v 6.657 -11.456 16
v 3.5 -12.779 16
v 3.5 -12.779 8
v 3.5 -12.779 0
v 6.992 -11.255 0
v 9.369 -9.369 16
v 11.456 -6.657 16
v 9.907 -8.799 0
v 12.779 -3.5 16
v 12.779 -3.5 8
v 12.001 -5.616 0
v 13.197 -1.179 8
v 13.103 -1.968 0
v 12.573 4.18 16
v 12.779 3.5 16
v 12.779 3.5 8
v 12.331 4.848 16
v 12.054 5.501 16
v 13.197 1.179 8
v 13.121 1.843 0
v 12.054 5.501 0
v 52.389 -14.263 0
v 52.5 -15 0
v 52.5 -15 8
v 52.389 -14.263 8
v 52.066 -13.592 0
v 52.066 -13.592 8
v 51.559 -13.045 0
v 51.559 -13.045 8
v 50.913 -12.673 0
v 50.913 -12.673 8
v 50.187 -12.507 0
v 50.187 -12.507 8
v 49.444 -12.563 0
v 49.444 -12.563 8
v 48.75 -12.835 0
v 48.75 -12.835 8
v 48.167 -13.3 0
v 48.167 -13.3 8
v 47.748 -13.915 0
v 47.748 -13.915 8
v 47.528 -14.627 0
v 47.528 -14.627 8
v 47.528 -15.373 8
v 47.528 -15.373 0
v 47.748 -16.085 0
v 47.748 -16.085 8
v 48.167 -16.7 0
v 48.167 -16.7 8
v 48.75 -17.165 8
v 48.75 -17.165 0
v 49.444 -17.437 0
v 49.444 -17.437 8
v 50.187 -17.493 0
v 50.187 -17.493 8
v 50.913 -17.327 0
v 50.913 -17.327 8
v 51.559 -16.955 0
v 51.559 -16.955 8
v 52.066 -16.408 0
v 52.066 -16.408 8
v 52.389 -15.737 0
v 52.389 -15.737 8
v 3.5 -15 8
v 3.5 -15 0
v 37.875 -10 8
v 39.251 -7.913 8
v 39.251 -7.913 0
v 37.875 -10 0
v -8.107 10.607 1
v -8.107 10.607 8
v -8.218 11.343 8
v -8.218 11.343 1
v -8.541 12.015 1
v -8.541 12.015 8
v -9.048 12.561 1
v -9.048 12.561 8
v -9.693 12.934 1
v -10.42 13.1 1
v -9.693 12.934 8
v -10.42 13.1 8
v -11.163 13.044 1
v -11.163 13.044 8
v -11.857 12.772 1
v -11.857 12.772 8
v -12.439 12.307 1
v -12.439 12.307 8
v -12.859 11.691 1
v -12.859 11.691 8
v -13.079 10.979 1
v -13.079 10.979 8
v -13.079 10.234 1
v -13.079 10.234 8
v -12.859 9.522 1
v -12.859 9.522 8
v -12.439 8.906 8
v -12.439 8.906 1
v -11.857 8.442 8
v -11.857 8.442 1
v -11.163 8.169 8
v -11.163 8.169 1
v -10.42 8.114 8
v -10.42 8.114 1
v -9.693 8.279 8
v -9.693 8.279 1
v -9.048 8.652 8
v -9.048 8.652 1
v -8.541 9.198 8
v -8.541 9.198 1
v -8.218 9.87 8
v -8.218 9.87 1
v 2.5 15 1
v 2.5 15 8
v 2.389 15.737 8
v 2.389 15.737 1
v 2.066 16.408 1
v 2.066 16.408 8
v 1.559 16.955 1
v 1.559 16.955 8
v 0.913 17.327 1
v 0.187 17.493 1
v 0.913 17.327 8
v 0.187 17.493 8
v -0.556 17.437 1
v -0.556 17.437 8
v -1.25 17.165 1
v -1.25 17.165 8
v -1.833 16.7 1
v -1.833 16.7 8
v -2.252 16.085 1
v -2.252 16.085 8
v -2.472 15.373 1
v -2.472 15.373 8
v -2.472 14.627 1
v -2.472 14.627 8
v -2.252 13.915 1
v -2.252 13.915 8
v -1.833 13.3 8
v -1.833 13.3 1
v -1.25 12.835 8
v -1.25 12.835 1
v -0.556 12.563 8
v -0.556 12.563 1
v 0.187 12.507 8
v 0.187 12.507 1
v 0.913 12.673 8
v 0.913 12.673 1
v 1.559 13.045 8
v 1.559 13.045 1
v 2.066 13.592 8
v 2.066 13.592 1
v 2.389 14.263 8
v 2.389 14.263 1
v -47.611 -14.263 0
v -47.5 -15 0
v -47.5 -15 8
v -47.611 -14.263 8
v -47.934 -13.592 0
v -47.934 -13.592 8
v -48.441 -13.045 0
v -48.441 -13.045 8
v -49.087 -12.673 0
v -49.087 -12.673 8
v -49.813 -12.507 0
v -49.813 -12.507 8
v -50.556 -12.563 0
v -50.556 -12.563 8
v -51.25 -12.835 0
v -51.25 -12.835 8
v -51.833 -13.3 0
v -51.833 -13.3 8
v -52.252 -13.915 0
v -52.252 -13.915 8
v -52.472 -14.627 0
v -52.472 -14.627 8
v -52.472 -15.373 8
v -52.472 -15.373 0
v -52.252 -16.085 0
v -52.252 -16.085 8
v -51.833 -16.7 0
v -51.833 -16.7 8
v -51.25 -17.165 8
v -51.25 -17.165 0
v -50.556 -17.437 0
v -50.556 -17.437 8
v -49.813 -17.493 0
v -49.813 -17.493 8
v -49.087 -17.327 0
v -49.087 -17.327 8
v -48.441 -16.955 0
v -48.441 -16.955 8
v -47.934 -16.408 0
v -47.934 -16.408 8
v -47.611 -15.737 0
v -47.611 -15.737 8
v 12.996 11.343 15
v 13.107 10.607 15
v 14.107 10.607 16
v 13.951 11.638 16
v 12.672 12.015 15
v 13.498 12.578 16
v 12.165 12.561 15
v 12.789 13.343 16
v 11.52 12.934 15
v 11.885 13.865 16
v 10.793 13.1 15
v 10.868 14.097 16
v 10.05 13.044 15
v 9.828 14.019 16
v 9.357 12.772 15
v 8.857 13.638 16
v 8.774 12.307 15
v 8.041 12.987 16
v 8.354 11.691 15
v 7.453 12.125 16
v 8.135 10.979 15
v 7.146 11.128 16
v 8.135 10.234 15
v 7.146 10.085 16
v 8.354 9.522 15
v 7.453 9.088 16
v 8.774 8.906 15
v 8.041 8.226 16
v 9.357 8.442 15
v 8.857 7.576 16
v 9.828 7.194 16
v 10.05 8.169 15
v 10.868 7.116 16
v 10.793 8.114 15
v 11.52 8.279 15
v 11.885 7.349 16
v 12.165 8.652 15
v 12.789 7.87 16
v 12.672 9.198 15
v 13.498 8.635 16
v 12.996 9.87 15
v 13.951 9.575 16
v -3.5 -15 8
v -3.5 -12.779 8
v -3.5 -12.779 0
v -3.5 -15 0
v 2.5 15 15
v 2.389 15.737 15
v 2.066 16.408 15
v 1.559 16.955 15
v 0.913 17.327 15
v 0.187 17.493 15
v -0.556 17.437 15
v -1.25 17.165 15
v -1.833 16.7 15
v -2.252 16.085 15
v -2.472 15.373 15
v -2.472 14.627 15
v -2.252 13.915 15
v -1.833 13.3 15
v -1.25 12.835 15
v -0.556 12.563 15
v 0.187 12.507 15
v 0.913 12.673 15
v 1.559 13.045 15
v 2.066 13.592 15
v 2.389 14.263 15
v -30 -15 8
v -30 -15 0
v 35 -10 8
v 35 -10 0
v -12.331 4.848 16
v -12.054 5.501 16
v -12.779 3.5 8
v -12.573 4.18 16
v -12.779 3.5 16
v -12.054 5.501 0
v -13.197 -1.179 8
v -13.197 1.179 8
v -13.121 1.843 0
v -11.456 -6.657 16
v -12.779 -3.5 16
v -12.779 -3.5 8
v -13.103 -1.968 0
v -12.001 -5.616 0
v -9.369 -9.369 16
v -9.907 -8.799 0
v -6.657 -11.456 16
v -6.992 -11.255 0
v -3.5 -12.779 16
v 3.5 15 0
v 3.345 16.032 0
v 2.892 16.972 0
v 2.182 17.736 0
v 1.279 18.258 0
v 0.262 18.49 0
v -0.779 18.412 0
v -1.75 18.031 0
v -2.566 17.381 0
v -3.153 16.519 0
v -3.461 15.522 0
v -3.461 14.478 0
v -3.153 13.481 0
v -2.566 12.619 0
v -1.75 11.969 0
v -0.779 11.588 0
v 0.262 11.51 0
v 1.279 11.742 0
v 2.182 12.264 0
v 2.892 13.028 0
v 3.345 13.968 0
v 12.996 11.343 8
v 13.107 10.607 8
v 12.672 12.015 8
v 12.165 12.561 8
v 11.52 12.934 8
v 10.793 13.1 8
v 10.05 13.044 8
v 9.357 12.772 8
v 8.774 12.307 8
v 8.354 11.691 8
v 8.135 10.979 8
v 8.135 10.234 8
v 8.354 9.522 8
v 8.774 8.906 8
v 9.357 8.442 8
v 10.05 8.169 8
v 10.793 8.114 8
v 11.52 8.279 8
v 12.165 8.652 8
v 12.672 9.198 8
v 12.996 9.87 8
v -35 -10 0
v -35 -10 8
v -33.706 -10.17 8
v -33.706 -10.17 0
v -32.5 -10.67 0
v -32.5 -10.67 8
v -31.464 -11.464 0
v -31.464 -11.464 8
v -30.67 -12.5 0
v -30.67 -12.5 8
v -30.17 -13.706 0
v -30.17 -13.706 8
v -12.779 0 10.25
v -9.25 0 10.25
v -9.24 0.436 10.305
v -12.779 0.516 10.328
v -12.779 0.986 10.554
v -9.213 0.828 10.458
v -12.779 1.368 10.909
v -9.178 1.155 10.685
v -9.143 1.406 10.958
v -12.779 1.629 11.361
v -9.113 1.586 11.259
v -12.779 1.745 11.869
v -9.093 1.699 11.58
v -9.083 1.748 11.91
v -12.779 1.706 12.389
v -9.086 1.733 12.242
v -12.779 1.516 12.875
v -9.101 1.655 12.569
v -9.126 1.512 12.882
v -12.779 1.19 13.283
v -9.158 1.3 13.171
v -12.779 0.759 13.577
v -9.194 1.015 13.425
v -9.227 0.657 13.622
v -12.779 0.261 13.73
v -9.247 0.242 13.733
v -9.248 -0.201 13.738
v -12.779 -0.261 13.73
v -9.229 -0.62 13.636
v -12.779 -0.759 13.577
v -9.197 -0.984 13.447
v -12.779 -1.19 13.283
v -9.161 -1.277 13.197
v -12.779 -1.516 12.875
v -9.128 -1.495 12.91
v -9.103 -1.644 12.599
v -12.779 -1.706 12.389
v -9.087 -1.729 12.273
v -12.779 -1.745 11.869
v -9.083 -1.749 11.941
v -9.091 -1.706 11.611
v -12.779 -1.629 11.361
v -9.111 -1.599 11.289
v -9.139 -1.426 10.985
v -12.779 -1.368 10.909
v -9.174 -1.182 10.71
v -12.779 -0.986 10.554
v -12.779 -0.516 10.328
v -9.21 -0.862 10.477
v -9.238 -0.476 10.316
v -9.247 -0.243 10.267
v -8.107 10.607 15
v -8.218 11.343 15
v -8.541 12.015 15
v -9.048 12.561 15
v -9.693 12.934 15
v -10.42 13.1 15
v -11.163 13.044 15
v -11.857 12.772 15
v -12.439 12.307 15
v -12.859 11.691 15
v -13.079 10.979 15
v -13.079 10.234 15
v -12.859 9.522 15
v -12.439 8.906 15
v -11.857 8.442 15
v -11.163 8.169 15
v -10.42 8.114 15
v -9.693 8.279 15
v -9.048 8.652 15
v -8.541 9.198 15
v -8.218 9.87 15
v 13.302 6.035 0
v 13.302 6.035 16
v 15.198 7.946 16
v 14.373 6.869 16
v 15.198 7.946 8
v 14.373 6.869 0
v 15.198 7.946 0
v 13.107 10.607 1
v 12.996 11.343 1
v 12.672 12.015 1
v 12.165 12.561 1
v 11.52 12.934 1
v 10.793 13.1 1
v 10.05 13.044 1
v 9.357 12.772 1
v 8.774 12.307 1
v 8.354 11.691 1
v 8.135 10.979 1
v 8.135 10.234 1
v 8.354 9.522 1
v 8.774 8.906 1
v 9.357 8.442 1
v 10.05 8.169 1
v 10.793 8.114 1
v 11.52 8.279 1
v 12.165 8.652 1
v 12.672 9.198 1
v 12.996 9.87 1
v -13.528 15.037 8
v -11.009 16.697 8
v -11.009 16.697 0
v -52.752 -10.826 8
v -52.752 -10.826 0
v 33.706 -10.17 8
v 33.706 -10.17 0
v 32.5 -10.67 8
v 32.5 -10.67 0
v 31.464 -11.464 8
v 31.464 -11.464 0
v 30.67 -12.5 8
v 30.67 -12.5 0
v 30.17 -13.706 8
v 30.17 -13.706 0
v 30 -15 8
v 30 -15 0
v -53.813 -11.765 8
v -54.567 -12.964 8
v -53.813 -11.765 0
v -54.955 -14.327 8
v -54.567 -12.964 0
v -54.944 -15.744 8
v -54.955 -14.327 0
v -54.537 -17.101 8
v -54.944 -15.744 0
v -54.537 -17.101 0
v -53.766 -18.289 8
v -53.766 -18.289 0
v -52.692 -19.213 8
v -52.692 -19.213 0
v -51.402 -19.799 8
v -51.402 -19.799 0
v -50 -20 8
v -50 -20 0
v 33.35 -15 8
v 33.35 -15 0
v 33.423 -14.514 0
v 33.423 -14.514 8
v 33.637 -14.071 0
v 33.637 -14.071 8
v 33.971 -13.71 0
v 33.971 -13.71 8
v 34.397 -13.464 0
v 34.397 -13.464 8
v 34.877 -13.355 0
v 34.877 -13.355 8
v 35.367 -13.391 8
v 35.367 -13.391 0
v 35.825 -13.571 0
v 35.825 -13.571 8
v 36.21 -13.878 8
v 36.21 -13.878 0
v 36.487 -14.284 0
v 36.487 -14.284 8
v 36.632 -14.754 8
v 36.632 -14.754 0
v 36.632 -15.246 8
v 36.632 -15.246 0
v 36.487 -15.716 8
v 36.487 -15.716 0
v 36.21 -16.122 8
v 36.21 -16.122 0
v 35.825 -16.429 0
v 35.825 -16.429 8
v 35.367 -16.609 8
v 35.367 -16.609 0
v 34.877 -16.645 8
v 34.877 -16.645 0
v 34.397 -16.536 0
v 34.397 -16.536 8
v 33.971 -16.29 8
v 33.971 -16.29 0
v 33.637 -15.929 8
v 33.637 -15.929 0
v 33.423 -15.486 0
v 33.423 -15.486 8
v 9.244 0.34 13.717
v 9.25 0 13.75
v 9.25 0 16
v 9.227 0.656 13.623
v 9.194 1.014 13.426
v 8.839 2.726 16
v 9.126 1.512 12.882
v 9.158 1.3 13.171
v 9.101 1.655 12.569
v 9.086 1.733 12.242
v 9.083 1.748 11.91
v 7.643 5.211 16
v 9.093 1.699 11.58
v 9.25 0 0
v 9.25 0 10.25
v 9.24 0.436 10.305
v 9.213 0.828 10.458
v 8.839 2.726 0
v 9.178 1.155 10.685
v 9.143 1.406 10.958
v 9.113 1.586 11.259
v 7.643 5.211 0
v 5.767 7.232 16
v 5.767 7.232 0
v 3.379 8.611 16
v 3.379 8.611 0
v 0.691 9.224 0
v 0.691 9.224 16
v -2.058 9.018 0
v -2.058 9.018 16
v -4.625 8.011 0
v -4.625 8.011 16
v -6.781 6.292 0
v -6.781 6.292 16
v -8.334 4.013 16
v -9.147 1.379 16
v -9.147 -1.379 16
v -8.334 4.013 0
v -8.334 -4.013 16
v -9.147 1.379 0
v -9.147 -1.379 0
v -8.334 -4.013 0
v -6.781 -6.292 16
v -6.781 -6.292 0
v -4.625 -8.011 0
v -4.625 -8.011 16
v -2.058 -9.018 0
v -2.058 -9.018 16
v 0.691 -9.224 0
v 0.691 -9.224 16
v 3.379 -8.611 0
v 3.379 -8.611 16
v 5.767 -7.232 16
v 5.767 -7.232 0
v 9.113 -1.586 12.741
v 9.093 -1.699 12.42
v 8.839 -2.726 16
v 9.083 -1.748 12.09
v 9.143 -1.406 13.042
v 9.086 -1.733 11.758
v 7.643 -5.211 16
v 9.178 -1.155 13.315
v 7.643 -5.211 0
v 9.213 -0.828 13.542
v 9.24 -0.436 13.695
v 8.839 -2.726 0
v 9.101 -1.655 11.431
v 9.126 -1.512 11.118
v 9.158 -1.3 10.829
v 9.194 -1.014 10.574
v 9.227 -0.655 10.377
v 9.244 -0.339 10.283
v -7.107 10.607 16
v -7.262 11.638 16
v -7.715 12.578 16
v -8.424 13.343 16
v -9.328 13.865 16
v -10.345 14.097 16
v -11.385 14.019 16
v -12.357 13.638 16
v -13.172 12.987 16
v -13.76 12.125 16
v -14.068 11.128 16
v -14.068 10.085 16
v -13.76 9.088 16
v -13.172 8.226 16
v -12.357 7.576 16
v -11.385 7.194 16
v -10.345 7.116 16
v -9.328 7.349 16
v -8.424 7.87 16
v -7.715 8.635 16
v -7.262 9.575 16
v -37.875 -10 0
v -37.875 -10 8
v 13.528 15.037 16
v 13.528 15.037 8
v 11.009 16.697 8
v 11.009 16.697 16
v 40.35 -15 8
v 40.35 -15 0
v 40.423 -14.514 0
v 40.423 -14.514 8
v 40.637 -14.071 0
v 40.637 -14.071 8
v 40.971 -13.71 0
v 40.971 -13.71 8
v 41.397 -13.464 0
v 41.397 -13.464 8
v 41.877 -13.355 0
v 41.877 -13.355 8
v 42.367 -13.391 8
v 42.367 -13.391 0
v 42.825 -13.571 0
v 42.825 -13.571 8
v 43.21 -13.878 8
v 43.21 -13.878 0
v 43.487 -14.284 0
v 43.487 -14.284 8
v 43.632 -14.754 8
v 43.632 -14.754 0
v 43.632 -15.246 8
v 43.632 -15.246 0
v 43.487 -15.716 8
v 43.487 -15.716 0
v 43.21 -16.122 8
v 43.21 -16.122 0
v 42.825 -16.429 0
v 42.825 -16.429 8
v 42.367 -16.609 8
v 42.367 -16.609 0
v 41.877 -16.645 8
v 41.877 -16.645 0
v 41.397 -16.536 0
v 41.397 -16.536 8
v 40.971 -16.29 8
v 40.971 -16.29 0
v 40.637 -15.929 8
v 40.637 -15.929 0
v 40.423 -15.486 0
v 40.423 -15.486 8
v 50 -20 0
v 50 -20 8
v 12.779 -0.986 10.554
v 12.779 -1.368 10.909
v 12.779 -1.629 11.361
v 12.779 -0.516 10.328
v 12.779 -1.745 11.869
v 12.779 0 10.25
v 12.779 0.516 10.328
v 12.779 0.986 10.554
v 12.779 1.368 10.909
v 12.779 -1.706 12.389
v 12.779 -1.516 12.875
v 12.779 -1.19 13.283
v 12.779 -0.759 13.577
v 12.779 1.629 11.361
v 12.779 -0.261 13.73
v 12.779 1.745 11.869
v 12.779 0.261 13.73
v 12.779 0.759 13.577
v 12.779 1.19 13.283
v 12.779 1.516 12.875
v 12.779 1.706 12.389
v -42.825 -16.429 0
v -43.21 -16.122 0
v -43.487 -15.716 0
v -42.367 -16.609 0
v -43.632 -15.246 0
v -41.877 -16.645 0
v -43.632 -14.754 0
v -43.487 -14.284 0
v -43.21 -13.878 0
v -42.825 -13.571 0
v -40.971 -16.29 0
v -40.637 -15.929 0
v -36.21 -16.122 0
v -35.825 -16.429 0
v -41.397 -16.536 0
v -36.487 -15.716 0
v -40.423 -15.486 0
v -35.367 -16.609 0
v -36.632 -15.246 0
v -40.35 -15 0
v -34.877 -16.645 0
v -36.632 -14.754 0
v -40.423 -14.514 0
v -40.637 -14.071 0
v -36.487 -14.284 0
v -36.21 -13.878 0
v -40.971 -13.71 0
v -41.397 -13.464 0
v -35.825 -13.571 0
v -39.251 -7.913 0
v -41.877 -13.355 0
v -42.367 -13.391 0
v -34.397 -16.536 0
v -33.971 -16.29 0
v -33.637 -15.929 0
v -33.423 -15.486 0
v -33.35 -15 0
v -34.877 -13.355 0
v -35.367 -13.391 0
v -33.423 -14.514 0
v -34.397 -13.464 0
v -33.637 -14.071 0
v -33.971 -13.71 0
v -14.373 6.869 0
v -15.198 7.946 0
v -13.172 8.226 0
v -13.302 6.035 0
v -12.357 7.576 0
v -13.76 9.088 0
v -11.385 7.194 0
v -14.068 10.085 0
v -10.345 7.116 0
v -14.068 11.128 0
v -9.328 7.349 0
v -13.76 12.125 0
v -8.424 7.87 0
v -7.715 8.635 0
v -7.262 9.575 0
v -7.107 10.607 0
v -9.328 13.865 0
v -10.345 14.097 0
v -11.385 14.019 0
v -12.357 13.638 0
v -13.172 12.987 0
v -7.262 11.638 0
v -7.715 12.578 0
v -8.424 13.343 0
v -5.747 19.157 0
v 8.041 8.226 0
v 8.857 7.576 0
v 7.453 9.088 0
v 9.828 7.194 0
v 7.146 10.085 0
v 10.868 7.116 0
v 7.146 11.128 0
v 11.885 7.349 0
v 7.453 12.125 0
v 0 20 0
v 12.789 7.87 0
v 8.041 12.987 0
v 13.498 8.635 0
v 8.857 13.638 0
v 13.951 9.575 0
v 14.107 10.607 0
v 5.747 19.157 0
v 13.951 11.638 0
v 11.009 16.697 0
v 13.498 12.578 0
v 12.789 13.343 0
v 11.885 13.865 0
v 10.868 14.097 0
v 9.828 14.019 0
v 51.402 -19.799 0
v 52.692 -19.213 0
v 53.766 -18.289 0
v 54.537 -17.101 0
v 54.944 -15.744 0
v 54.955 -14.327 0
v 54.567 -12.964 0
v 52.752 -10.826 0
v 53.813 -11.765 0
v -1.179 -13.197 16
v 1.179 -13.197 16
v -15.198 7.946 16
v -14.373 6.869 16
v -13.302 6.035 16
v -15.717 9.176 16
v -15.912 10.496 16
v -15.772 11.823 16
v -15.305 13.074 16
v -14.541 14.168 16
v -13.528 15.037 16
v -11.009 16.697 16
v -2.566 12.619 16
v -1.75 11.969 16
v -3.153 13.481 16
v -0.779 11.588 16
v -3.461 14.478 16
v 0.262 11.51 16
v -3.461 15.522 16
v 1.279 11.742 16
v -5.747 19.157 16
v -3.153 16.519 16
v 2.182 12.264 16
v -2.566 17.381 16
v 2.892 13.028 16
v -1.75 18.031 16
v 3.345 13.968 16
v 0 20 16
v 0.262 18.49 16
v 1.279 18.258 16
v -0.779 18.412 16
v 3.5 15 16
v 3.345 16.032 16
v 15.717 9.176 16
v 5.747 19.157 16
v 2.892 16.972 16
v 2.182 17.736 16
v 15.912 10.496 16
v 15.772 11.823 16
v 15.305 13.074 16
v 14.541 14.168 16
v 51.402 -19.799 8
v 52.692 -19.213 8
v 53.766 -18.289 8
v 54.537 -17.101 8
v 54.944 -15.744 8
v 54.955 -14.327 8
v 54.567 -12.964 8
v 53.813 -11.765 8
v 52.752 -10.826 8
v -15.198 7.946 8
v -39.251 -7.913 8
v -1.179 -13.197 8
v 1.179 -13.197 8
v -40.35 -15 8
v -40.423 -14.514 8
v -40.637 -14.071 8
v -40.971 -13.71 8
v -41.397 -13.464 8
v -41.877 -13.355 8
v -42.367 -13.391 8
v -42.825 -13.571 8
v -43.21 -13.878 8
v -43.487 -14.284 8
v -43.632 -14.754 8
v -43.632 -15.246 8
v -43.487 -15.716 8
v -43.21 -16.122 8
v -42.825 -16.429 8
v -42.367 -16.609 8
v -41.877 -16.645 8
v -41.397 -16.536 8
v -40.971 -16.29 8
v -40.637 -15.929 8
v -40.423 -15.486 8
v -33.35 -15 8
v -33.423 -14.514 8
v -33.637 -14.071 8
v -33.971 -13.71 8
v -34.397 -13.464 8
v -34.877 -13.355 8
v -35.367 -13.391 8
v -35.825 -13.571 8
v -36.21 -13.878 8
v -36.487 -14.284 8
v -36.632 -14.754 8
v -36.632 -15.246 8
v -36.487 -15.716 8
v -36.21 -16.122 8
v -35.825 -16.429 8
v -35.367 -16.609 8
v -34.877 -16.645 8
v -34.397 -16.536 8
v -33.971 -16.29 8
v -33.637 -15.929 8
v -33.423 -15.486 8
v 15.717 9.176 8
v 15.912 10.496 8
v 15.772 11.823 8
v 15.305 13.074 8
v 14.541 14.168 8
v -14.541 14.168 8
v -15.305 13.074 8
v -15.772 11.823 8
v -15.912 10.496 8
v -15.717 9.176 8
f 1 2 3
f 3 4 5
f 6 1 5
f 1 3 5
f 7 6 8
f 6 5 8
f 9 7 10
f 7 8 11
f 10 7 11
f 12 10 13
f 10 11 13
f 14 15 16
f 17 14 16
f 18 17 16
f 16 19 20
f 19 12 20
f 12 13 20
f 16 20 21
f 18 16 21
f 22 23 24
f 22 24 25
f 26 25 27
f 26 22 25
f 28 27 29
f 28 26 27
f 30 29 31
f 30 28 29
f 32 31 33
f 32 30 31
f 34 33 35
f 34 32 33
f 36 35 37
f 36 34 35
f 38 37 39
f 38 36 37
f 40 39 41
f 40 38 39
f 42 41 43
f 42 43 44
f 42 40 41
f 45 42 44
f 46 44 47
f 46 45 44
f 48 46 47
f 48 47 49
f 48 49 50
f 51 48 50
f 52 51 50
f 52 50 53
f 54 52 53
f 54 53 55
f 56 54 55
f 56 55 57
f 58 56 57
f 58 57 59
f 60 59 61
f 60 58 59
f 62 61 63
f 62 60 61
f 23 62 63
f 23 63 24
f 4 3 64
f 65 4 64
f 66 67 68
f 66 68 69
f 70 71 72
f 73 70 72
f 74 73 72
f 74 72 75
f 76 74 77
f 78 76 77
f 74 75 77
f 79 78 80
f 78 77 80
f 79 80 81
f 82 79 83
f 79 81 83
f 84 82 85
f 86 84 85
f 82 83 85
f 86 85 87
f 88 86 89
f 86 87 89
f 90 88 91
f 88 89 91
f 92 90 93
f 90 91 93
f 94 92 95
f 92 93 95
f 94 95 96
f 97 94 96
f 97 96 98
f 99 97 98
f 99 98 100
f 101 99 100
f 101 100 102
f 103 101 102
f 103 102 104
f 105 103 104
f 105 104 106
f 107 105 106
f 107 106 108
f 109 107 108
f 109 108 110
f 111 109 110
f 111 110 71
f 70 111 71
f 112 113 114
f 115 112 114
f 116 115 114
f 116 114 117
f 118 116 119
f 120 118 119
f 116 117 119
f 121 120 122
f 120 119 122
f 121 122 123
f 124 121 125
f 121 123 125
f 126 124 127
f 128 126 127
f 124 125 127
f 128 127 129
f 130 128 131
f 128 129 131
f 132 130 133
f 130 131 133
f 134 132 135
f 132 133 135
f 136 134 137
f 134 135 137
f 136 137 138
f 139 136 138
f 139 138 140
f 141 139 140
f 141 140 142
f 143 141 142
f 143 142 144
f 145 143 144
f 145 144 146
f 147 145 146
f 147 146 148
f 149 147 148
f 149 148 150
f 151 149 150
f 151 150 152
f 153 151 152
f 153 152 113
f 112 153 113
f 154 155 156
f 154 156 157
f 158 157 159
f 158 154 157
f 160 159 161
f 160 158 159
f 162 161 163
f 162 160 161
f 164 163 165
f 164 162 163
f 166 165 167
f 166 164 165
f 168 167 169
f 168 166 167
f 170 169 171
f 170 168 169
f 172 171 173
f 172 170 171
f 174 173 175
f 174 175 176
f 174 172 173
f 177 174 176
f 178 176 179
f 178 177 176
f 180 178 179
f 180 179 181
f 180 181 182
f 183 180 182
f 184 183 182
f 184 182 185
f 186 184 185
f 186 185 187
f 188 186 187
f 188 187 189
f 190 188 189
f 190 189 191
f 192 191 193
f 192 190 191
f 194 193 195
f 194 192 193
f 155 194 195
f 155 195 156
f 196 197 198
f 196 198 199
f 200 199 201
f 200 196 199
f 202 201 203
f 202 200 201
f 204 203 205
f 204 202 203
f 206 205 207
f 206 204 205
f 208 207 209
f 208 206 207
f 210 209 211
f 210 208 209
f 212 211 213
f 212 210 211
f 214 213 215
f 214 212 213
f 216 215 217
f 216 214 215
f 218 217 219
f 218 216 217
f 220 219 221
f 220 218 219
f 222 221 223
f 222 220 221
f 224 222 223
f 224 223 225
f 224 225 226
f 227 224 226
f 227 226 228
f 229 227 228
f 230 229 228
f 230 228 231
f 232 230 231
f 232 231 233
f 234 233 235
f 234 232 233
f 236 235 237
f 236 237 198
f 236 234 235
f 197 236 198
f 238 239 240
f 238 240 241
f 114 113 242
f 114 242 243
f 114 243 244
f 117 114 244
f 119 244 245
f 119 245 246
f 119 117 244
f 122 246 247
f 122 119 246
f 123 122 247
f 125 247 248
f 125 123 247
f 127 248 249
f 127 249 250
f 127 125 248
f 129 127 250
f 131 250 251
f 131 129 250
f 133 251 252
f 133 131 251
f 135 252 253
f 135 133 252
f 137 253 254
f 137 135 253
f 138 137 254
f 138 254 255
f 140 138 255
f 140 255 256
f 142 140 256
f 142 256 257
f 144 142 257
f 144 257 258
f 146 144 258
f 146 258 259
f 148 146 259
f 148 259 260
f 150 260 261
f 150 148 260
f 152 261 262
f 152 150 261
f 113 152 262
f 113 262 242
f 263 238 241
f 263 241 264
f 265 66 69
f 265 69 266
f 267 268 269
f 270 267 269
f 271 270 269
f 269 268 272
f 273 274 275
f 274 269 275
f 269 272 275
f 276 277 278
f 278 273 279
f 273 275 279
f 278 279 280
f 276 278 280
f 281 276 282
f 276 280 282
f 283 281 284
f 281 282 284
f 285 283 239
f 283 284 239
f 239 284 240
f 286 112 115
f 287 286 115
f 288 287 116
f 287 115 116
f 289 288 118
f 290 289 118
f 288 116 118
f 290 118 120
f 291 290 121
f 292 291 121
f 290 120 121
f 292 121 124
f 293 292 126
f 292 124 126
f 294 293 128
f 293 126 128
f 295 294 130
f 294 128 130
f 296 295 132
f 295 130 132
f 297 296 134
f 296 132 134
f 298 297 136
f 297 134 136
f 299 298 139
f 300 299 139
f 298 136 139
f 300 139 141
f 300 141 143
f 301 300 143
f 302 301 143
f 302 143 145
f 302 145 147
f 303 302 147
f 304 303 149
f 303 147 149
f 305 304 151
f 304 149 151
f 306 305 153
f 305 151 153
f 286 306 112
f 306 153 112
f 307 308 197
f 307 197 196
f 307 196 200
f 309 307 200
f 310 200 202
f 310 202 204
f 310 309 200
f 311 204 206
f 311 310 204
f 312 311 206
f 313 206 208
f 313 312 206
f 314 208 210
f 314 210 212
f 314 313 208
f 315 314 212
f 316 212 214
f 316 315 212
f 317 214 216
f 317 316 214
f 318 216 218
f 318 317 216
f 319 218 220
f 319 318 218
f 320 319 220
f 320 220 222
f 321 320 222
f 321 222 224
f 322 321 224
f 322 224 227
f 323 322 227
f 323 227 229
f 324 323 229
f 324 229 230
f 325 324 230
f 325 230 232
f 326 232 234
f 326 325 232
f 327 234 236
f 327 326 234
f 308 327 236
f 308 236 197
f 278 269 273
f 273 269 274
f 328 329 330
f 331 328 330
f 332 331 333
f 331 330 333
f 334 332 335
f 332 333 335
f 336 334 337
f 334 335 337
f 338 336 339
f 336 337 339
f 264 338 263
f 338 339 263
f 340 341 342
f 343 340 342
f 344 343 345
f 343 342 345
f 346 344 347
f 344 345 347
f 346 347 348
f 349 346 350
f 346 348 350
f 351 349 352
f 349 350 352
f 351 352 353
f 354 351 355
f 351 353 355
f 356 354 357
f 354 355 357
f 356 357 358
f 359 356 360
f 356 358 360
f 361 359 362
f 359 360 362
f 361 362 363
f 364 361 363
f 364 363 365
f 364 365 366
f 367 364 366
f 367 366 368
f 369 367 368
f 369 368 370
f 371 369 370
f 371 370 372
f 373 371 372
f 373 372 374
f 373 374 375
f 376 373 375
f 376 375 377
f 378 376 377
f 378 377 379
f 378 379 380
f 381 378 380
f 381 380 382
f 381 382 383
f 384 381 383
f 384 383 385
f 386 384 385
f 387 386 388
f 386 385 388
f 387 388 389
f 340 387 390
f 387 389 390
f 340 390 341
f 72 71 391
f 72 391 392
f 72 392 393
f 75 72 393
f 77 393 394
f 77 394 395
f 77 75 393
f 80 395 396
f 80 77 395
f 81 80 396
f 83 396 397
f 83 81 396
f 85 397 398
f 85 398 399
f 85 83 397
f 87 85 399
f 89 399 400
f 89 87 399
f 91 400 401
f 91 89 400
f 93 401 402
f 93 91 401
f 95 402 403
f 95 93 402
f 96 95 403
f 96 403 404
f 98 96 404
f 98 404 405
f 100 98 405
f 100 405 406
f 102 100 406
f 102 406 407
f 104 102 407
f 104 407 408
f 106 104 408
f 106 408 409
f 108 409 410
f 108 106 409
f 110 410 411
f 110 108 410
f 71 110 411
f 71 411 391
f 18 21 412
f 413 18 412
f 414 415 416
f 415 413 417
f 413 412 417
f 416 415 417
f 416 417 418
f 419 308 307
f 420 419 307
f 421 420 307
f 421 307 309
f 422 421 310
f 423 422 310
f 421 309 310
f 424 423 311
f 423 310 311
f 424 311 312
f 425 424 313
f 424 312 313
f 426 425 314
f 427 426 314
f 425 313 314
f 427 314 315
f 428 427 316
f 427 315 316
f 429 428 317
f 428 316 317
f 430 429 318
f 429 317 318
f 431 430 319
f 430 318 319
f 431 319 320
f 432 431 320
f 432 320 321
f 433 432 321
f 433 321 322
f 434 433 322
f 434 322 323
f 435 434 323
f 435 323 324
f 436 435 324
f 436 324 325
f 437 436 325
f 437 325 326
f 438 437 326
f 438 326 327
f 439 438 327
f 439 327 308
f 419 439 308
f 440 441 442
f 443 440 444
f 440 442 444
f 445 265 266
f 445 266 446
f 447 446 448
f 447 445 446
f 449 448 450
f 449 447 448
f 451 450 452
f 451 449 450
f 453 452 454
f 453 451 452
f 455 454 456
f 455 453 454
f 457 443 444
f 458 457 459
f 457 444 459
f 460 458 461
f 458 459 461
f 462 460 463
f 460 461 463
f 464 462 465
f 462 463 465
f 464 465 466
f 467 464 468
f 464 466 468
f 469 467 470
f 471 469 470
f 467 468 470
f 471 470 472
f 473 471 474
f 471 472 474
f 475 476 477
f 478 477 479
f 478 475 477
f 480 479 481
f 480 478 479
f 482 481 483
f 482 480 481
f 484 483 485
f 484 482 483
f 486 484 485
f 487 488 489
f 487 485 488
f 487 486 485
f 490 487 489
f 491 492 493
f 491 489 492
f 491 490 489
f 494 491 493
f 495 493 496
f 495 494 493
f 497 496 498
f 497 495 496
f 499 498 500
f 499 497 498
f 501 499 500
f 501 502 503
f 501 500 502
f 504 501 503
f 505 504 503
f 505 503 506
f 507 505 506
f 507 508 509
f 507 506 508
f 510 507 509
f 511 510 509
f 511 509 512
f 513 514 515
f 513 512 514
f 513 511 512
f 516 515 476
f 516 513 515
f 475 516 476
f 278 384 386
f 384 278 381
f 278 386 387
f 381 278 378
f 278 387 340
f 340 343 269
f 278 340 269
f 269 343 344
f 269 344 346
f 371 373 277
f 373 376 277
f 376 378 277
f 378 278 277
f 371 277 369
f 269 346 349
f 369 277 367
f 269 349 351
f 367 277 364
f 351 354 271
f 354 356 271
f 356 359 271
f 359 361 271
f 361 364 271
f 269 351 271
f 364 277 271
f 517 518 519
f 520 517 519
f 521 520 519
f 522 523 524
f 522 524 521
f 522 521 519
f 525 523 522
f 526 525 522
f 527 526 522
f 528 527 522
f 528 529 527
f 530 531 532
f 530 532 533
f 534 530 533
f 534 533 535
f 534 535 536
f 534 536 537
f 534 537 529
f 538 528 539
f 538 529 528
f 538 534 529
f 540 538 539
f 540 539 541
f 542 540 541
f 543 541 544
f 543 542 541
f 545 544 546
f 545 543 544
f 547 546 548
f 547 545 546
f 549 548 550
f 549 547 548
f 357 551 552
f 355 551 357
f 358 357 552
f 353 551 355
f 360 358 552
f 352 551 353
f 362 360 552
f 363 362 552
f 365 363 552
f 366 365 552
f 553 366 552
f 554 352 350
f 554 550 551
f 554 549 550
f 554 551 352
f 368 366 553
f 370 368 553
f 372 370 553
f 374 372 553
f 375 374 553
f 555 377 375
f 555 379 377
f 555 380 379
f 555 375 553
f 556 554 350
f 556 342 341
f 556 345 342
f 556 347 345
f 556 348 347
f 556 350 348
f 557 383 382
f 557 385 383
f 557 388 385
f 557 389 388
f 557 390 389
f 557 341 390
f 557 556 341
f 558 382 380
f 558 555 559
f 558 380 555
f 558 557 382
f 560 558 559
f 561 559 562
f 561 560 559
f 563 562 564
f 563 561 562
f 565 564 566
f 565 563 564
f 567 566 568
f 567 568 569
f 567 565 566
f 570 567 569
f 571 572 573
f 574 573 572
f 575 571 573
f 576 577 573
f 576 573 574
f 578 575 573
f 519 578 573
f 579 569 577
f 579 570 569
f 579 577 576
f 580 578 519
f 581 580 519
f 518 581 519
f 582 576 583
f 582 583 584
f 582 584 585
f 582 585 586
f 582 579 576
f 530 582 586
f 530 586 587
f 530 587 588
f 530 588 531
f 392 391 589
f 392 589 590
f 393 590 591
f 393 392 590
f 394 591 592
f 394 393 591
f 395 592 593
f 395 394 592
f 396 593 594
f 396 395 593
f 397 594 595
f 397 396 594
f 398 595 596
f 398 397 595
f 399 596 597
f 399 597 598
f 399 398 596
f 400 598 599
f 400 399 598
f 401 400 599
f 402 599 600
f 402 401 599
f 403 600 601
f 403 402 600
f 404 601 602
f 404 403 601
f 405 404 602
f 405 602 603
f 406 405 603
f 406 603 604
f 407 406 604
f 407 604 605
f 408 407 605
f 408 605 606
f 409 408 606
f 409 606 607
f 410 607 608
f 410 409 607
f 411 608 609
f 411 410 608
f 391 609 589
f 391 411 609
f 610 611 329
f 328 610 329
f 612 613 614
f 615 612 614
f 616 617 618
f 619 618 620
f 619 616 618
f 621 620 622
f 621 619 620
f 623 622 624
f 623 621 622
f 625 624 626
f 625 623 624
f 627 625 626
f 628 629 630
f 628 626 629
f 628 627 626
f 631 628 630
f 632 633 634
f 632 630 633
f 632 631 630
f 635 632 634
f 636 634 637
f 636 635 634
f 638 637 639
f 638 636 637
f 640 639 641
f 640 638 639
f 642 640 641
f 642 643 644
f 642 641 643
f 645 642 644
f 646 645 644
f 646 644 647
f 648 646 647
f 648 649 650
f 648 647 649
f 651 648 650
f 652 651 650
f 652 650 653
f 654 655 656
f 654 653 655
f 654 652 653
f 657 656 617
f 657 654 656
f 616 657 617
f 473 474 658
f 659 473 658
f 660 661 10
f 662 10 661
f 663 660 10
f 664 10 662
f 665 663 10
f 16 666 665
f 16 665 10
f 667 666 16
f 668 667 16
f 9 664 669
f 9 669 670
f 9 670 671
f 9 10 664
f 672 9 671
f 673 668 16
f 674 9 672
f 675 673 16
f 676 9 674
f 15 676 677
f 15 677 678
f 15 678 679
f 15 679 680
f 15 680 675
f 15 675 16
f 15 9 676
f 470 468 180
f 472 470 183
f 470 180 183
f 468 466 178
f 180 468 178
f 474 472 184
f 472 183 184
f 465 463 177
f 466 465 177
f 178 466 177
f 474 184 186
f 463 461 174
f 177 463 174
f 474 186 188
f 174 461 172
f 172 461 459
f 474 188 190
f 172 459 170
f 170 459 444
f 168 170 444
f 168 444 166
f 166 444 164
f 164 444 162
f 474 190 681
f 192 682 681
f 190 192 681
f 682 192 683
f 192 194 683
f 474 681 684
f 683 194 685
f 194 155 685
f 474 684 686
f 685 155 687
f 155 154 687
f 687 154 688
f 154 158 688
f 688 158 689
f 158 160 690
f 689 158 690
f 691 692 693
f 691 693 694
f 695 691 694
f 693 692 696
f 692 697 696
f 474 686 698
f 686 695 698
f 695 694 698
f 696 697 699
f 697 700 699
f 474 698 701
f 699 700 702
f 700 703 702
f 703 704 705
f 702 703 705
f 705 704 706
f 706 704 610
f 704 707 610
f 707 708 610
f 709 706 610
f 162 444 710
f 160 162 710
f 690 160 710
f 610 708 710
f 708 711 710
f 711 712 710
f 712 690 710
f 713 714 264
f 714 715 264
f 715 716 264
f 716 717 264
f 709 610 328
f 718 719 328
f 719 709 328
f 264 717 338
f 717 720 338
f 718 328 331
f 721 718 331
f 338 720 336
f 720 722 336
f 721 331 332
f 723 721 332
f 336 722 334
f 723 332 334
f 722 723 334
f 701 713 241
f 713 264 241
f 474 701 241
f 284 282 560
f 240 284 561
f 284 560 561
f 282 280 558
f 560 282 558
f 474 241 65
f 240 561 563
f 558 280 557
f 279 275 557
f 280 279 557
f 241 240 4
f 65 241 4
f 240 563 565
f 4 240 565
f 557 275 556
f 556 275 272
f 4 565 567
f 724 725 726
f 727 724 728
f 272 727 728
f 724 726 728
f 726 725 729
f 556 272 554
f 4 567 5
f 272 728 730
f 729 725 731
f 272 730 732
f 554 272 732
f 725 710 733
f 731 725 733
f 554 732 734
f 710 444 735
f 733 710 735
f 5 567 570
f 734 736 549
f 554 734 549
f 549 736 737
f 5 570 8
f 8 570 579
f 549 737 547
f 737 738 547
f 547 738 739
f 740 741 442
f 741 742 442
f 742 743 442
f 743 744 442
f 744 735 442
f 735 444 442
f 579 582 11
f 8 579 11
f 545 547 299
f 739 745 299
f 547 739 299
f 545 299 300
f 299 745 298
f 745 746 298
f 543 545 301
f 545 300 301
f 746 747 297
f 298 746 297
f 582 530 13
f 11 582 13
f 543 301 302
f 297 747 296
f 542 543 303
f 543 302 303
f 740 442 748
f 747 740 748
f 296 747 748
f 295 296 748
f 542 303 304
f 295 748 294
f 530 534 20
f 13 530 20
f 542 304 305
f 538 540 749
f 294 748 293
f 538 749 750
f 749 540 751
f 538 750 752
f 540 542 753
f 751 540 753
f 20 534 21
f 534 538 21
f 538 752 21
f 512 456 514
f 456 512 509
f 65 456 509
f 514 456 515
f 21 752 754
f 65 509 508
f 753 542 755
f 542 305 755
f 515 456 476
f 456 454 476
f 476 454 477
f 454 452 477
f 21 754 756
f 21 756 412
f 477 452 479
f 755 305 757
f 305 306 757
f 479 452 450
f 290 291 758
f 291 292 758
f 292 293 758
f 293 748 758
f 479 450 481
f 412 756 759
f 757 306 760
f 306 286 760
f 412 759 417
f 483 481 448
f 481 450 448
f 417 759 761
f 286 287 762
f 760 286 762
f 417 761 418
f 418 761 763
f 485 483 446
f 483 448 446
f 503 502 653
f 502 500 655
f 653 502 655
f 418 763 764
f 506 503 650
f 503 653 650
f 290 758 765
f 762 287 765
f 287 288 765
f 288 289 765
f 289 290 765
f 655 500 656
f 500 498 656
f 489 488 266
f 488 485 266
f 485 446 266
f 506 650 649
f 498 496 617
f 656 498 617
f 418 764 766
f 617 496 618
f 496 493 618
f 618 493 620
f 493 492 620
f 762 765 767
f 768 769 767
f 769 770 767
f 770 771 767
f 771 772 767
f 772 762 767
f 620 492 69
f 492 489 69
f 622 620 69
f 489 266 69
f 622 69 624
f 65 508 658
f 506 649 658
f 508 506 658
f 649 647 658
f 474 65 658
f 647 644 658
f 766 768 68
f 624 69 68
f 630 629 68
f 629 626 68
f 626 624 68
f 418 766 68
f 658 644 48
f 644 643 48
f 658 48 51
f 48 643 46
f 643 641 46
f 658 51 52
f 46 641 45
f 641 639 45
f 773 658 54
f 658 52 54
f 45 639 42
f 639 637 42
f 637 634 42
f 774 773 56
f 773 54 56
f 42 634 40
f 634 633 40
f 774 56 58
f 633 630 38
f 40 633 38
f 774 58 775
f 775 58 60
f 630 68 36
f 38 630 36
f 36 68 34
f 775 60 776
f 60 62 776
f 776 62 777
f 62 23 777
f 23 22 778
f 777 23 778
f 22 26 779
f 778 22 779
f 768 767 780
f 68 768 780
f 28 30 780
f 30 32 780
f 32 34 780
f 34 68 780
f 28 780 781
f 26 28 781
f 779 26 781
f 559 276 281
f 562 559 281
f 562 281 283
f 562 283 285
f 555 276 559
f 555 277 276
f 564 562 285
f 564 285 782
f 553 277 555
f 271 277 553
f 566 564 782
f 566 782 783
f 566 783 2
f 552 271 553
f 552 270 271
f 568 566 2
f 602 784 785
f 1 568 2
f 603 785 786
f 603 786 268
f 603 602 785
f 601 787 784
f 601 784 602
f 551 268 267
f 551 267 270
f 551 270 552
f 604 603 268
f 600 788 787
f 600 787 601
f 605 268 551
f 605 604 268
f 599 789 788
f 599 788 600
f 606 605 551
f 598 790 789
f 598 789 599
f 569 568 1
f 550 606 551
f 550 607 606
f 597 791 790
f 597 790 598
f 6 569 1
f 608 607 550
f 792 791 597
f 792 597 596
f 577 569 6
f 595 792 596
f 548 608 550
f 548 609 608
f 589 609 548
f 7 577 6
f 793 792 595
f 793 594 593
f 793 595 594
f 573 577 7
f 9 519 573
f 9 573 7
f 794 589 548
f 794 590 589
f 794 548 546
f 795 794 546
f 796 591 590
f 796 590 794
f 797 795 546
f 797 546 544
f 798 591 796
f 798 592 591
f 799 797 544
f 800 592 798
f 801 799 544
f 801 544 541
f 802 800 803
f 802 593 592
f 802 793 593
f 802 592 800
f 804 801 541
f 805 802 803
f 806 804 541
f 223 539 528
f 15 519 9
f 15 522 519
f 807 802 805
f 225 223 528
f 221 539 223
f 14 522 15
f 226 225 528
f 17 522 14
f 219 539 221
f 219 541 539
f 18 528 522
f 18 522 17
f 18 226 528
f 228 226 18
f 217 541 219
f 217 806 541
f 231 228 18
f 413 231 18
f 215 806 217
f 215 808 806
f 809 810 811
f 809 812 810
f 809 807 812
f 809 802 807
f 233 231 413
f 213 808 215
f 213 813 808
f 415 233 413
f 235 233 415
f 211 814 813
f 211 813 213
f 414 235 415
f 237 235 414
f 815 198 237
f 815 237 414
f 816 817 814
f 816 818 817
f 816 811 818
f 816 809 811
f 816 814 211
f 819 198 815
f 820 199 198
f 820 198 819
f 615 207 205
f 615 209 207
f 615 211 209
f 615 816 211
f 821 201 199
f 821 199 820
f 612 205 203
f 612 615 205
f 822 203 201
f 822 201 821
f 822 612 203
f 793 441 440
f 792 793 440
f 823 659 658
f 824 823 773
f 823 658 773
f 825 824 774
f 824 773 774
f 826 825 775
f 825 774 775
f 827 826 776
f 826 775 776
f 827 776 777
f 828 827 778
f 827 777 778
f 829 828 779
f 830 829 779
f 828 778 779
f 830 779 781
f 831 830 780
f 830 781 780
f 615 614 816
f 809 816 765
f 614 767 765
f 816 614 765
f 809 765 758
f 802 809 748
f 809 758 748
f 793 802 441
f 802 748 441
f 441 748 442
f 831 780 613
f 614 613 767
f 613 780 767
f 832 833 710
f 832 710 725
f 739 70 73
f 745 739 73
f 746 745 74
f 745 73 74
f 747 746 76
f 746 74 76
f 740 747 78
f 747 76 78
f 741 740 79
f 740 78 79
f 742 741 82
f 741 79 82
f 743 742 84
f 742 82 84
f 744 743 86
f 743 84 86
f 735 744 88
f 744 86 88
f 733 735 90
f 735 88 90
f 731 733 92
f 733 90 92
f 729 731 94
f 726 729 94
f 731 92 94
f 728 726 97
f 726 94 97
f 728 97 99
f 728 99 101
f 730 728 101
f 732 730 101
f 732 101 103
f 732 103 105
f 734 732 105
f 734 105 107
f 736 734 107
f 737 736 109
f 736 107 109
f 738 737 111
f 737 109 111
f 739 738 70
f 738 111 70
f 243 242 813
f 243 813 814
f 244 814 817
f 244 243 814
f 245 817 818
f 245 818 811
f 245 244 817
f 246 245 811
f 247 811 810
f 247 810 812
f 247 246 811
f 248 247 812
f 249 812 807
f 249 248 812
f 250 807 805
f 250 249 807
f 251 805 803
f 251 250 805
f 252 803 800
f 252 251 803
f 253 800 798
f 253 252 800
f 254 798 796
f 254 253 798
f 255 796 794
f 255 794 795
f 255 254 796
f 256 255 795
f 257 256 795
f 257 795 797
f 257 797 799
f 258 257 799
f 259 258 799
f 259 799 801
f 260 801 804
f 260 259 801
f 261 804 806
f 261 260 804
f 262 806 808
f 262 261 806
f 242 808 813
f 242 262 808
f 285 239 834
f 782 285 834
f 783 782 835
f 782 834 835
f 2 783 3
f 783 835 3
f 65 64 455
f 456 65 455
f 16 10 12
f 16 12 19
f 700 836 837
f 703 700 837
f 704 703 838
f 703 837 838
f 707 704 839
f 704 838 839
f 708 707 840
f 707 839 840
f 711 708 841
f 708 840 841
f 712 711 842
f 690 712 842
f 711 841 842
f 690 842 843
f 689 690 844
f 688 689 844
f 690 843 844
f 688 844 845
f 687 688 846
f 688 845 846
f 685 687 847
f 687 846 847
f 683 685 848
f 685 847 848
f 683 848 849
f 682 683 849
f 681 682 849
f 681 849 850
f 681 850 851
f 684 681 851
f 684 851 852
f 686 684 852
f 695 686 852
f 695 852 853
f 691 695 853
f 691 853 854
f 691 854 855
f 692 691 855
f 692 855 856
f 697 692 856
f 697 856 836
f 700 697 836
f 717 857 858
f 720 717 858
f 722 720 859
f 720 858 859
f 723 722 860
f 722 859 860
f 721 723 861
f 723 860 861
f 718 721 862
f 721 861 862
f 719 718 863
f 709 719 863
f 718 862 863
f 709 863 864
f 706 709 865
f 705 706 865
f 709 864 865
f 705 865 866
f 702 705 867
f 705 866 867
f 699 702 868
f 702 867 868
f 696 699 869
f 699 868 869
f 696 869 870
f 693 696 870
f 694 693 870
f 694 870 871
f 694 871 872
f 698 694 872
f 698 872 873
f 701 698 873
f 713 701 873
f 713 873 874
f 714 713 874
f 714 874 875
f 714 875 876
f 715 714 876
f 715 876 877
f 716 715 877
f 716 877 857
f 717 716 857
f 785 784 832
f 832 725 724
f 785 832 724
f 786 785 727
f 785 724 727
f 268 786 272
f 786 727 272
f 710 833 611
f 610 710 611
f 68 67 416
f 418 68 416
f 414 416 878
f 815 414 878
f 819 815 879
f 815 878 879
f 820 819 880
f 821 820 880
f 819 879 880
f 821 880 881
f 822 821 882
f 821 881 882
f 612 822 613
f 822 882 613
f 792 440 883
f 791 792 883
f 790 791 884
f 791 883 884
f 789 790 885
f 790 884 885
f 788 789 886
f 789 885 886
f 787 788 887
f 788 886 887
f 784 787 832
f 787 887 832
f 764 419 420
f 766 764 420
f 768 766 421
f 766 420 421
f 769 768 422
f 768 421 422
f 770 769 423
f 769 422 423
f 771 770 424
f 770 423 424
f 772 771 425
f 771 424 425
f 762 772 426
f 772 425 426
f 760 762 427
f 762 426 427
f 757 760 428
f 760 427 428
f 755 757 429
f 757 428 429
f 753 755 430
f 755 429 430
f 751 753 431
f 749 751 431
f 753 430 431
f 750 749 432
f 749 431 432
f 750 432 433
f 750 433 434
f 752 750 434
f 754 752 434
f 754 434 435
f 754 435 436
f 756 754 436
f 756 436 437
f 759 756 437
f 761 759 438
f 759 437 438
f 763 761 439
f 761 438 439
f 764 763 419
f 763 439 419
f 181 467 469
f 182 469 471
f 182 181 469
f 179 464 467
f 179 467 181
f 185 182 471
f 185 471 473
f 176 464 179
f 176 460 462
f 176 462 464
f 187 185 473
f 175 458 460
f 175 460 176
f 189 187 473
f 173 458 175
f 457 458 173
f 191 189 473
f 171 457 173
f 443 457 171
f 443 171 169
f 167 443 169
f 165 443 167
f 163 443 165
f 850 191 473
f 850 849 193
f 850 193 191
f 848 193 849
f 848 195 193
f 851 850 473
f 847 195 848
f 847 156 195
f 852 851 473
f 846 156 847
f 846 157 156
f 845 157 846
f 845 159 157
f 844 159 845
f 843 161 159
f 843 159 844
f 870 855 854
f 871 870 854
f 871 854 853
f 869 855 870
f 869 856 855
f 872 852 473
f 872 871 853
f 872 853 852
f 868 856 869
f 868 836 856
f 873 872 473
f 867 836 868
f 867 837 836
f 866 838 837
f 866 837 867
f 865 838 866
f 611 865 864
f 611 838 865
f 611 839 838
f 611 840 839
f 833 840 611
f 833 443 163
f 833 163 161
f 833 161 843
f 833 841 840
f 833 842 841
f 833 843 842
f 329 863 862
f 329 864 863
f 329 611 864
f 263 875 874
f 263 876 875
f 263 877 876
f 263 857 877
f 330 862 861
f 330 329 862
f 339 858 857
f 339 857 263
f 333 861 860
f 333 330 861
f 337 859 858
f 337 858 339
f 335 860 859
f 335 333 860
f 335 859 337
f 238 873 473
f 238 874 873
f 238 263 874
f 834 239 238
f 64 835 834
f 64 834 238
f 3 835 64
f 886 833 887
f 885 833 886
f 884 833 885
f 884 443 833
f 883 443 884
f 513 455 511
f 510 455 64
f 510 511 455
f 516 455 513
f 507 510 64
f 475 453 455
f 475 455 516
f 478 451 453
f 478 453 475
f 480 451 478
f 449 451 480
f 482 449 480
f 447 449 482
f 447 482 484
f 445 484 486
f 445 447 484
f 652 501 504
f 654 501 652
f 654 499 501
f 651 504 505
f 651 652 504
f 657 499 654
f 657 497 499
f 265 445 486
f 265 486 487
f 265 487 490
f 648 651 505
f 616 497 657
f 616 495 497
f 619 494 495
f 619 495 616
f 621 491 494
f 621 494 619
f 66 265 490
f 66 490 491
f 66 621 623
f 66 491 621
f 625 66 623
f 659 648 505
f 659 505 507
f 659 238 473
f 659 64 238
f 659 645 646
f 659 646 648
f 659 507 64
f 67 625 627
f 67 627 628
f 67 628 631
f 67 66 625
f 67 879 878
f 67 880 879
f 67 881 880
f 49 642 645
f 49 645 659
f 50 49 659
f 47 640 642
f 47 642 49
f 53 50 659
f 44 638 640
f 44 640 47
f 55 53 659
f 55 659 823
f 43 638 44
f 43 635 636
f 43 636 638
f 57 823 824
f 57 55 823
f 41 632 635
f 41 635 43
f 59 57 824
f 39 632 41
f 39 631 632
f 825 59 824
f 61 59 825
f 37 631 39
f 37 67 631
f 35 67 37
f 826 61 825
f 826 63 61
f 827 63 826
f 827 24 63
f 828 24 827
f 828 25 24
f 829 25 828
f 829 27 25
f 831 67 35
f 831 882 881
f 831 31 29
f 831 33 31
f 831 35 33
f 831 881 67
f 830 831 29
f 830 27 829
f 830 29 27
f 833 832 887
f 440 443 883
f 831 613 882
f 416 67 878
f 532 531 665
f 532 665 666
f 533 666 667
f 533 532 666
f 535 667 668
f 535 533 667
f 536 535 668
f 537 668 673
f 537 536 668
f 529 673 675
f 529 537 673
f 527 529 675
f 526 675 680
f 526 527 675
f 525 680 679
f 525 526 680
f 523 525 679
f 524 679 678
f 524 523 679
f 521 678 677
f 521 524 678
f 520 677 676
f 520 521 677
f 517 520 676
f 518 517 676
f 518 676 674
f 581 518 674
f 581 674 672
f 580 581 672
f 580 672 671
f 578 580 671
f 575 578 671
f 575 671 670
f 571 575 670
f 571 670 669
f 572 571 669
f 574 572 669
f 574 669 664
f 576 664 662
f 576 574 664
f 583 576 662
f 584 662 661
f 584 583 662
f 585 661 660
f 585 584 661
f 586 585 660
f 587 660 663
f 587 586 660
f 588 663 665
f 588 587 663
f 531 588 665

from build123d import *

# Parameters (mm, degrees)
SKETCH_1_R               = 9.25
SKETCH_1_R_2             = 2.5
EXTRUDE_1_DEPTH          = 8
SKETCH_2_R               = 2.5
CUT_EXTRUDE_1_DEPTH      = 9
CUT_EXTRUDE_2_DEPTH      = 9
SKETCH_8_R               = 9.25
SKETCH_8_R_2             = 2.5
EXTRUDE_2_DEPTH          = 8
SKETCH_9_R               = 1.75
CUT_EXTRUDE_5_DEPTH      = 56
CUT_EXTRUDE_5_DEPTH_BACK = 56
SKETCH_11_W              = 2.84011948
SKETCH_11_H              = 7
CUT_EXTRUDE_6_DEPTH      = 8
EXTRUDE_3_DEPTH          = 8
SKETCH_12_R              = 1.65
CUT_EXTRUDE_7_DEPTH      = 9
CHAMFER_2_SIZE           = 1


with BuildPart() as part:
    # Sketch 1 → Extrude 1 (new body)
    with BuildSketch(Plane.XY):
        with BuildLine():
            Line((-50, -20), (50, -20))
            ThreePointArc((50, -20), (54.789131426, -16.436739428), (52.752293578, -10.825688073))
            Line((52.752293578, -10.825688073), (11.009174312, 16.697247706))
            ThreePointArc((11.009174312, 16.697247706), (0, 20), (-11.009174312, 16.697247706))
            Line((-11.009174312, 16.697247706), (-52.752293578, -10.825688073))
            ThreePointArc((-52.752293578, -10.825688073), (-54.789131426, -16.436739428), (-50, -20))
        make_face()
        Circle(SKETCH_1_R, mode=Mode.SUBTRACT)
        with Locations((50, -15)):
            Circle(SKETCH_1_R_2, mode=Mode.SUBTRACT)
        with Locations((-50, -15)):
            Circle(SKETCH_1_R_2, mode=Mode.SUBTRACT)
    extrude(amount=EXTRUDE_1_DEPTH)

    # Sketch 2 → Cut-Extrude 1 (cut, through all)
    with BuildSketch(Plane.XY.offset(8)):
        with Locations((0, 15)):
            Circle(SKETCH_2_R)
        with Locations((-10.606601718, 10.606601718)):
            Circle(SKETCH_2_R)
        with Locations((10.606601718, 10.606601718)):
            Circle(SKETCH_2_R)
    extrude(amount=-CUT_EXTRUDE_1_DEPTH, mode=Mode.SUBTRACT)

    # Sketch 3 → Cut-Extrude 2 (cut, through all)
    with BuildSketch(Plane.XY.offset(8)):
        with BuildLine():
            Line((-44.573394495, -11.422018349), (-15.198052695, 7.946338883))
            ThreePointArc((-15.198052695, 7.946338883), (-13.864095006, 6.417668929), (-12.053948035, 5.501348633))
            ThreePointArc((-12.053948035, 5.501348633), (-12.001148515, -5.615597414), (-3.5, -12.779377919))
            Line((-3.5, -12.779377919), (-3.5, -15))
            Line((-3.5, -15), (-43.5, -15))
            ThreePointArc((-43.5, -15), (-43.774129146, -13.132238744), (-44.573394495, -11.422018349))
        make_face()
    cut_extrude_2 = extrude(amount=-CUT_EXTRUDE_2_DEPTH, mode=Mode.SUBTRACT)

    # Mirror 1: Cut-Extrude 2 across plane
    add(cut_extrude_2.mirror(Plane(origin=(0, 0, 0), x_dir=(0, 0, 1), z_dir=(1, 0, 0))), mode=Mode.SUBTRACT)

    # Sketch 8 → Extrude 2 (add)
    with BuildSketch(Plane.XY.offset(8)):
        with BuildLine():
            Line((-11.009174312, 16.697247706), (-13.527583827, 15.036757916))
            ThreePointArc((-13.527583827, 15.036757916), (-15.771645109, 11.823461278), (-15.198052695, 7.946338883))
            ThreePointArc((-15.198052695, 7.946338883), (-13.864095006, 6.417668929), (-12.053948035, 5.501348633))
            ThreePointArc((-12.053948035, 5.501348633), (-12.001148515, -5.615597414), (-3.5, -12.779377919))
            ThreePointArc((-3.5, -12.779377919), (0, -13.25), (3.5, -12.779377919))
            ThreePointArc((3.5, -12.779377919), (12.001148515, -5.615597414), (12.053948035, 5.501348633))
            ThreePointArc((12.053948035, 5.501348633), (13.864095006, 6.417668929), (15.198052695, 7.946338883))
            ThreePointArc((15.198052695, 7.946338883), (15.771645109, 11.823461278), (13.527583827, 15.036757916))
            Line((13.527583827, 15.036757916), (11.009174312, 16.697247706))
            ThreePointArc((11.009174312, 16.697247706), (0, 20), (-11.009174312, 16.697247706))
        make_face()
        Circle(SKETCH_8_R, mode=Mode.SUBTRACT)
        with Locations((-10.606601718, 10.606601718)):
            Circle(SKETCH_8_R_2, mode=Mode.SUBTRACT)
        with Locations((10.606601718, 10.606601718)):
            Circle(SKETCH_8_R_2, mode=Mode.SUBTRACT)
        with Locations((0, 15)):
            Circle(SKETCH_8_R_2, mode=Mode.SUBTRACT)
    extrude(amount=EXTRUDE_2_DEPTH)

    # Sketch 9 → Cut-Extrude 5 (cut, two sides)
    with BuildSketch(Plane(origin=(0, 0, 0), x_dir=(0, 0, -1), z_dir=(1, 0, 0))) as cut_extrude_5_sk:
        with Locations((-12, 0)):
            Circle(SKETCH_9_R)
    extrude(amount=CUT_EXTRUDE_5_DEPTH, mode=Mode.SUBTRACT)
    extrude(cut_extrude_5_sk.sketch, amount=-CUT_EXTRUDE_5_DEPTH_BACK, mode=Mode.SUBTRACT)

    # Sketch 11 → Cut-Extrude 6 (cut)
    with BuildSketch(Plane.XY.offset(16)):
        with Locations((14.199437659, 0)):
            Rectangle(SKETCH_11_W, SKETCH_11_H)
        with Locations((-14.199437659, 0)):
            Rectangle(SKETCH_11_W, SKETCH_11_H)
    extrude(amount=-CUT_EXTRUDE_6_DEPTH, mode=Mode.SUBTRACT)

    # Sketch 13 → Extrude 3 (add)
    with BuildSketch(Plane.XY.offset(8)):
        with BuildLine():
            Line((-37.875, -10), (-35, -10))
            ThreePointArc((-35, -10), (-30, -15), (-35, -20))
            Line((-35, -20), (-44.573394495, -20))
            Line((-44.573394495, -20), (-44.573394495, -11.422018349))
            Line((-44.573394495, -11.422018349), (-39.251146789, -7.912844037))
            Line((-39.251146789, -7.912844037), (-37.875, -10))
        make_face()
    extrude_3 = extrude(amount=-EXTRUDE_3_DEPTH)

    # Sketch 12 → Cut-Extrude 7 (cut, through all)
    with BuildSketch(Plane.XY.offset(8)):
        with Locations((-42, -15)):
            Circle(SKETCH_12_R)
        with Locations((-35, -15)):
            Circle(SKETCH_12_R)
    cut_extrude_7 = extrude(amount=-CUT_EXTRUDE_7_DEPTH, mode=Mode.SUBTRACT)

    # Mirror 2: Extrude 3, Cut-Extrude 7 across plane
    add(extrude_3.mirror(Plane(origin=(0, 0, 0), x_dir=(0, 0, 1), z_dir=(1, 0, 0))))
    add(cut_extrude_7.mirror(Plane(origin=(0, 0, 0), x_dir=(0, 0, 1), z_dir=(1, 0, 0))), mode=Mode.SUBTRACT)

    # Chamfer 2
    chamfer_2_edges = [part.edges().sort_by_distance(p)[0] for p in [
        (8.106601718, 10.606601718, 0),
        (-13.106601718, 10.606601718, 0),
        (-2.5, 15, 0),
        (-13.106601718, 10.606601718, 16),
        (-2.5, 15, 16),
        (8.106601718, 10.606601718, 16),
    ]]
    chamfer(chamfer_2_edges, length=CHAMFER_2_SIZE)


solid = part.part
